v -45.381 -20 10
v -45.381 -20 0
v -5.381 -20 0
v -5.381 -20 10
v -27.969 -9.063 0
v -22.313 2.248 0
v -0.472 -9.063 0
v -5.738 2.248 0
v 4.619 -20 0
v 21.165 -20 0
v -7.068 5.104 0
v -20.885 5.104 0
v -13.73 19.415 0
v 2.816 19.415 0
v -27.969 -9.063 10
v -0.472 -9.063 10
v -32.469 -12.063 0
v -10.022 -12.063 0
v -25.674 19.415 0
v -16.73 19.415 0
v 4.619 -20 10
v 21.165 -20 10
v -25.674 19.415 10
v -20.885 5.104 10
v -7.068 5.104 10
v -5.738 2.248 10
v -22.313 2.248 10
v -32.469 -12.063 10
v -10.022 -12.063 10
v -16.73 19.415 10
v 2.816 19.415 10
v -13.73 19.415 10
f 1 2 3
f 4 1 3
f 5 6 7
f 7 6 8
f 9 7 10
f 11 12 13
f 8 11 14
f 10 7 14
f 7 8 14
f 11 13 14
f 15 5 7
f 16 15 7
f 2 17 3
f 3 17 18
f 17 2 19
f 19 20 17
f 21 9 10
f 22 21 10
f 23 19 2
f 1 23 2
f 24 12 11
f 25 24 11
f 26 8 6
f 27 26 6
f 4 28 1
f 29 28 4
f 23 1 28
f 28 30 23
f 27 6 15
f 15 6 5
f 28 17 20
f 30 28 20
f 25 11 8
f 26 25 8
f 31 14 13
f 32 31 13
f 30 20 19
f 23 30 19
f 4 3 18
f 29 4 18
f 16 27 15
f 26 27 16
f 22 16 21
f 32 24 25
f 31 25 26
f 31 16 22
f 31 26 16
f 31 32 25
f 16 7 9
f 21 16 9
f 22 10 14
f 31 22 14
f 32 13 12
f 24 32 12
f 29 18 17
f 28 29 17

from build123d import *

# Parameters (mm, degrees)
F1_DEPTH = 10


with BuildPart() as f1:
    # F0 (on Top) → F1 (new body)
    with BuildSketch(Plane.XY):
        Polygon((-25.673916, 19.414563), (-45.381198, -20), (-5.381198, -20), (-10.021686, -12.063301), (-32.468576, -12.063301), (-16.729644, 19.414563), align=None)
        Polygon((4.618802, -20), (21.16451, -20), (2.816064, 19.414563), (-13.729644, 19.414563), (-20.885062, 5.103728), (-7.067599, 5.103728), (-5.737971, 2.247534), (-22.313159, 2.247534), (-27.968576, -9.063301), (-0.4725, -9.063301), align=None)
    extrude(amount=F1_DEPTH)


solid = f1.part
